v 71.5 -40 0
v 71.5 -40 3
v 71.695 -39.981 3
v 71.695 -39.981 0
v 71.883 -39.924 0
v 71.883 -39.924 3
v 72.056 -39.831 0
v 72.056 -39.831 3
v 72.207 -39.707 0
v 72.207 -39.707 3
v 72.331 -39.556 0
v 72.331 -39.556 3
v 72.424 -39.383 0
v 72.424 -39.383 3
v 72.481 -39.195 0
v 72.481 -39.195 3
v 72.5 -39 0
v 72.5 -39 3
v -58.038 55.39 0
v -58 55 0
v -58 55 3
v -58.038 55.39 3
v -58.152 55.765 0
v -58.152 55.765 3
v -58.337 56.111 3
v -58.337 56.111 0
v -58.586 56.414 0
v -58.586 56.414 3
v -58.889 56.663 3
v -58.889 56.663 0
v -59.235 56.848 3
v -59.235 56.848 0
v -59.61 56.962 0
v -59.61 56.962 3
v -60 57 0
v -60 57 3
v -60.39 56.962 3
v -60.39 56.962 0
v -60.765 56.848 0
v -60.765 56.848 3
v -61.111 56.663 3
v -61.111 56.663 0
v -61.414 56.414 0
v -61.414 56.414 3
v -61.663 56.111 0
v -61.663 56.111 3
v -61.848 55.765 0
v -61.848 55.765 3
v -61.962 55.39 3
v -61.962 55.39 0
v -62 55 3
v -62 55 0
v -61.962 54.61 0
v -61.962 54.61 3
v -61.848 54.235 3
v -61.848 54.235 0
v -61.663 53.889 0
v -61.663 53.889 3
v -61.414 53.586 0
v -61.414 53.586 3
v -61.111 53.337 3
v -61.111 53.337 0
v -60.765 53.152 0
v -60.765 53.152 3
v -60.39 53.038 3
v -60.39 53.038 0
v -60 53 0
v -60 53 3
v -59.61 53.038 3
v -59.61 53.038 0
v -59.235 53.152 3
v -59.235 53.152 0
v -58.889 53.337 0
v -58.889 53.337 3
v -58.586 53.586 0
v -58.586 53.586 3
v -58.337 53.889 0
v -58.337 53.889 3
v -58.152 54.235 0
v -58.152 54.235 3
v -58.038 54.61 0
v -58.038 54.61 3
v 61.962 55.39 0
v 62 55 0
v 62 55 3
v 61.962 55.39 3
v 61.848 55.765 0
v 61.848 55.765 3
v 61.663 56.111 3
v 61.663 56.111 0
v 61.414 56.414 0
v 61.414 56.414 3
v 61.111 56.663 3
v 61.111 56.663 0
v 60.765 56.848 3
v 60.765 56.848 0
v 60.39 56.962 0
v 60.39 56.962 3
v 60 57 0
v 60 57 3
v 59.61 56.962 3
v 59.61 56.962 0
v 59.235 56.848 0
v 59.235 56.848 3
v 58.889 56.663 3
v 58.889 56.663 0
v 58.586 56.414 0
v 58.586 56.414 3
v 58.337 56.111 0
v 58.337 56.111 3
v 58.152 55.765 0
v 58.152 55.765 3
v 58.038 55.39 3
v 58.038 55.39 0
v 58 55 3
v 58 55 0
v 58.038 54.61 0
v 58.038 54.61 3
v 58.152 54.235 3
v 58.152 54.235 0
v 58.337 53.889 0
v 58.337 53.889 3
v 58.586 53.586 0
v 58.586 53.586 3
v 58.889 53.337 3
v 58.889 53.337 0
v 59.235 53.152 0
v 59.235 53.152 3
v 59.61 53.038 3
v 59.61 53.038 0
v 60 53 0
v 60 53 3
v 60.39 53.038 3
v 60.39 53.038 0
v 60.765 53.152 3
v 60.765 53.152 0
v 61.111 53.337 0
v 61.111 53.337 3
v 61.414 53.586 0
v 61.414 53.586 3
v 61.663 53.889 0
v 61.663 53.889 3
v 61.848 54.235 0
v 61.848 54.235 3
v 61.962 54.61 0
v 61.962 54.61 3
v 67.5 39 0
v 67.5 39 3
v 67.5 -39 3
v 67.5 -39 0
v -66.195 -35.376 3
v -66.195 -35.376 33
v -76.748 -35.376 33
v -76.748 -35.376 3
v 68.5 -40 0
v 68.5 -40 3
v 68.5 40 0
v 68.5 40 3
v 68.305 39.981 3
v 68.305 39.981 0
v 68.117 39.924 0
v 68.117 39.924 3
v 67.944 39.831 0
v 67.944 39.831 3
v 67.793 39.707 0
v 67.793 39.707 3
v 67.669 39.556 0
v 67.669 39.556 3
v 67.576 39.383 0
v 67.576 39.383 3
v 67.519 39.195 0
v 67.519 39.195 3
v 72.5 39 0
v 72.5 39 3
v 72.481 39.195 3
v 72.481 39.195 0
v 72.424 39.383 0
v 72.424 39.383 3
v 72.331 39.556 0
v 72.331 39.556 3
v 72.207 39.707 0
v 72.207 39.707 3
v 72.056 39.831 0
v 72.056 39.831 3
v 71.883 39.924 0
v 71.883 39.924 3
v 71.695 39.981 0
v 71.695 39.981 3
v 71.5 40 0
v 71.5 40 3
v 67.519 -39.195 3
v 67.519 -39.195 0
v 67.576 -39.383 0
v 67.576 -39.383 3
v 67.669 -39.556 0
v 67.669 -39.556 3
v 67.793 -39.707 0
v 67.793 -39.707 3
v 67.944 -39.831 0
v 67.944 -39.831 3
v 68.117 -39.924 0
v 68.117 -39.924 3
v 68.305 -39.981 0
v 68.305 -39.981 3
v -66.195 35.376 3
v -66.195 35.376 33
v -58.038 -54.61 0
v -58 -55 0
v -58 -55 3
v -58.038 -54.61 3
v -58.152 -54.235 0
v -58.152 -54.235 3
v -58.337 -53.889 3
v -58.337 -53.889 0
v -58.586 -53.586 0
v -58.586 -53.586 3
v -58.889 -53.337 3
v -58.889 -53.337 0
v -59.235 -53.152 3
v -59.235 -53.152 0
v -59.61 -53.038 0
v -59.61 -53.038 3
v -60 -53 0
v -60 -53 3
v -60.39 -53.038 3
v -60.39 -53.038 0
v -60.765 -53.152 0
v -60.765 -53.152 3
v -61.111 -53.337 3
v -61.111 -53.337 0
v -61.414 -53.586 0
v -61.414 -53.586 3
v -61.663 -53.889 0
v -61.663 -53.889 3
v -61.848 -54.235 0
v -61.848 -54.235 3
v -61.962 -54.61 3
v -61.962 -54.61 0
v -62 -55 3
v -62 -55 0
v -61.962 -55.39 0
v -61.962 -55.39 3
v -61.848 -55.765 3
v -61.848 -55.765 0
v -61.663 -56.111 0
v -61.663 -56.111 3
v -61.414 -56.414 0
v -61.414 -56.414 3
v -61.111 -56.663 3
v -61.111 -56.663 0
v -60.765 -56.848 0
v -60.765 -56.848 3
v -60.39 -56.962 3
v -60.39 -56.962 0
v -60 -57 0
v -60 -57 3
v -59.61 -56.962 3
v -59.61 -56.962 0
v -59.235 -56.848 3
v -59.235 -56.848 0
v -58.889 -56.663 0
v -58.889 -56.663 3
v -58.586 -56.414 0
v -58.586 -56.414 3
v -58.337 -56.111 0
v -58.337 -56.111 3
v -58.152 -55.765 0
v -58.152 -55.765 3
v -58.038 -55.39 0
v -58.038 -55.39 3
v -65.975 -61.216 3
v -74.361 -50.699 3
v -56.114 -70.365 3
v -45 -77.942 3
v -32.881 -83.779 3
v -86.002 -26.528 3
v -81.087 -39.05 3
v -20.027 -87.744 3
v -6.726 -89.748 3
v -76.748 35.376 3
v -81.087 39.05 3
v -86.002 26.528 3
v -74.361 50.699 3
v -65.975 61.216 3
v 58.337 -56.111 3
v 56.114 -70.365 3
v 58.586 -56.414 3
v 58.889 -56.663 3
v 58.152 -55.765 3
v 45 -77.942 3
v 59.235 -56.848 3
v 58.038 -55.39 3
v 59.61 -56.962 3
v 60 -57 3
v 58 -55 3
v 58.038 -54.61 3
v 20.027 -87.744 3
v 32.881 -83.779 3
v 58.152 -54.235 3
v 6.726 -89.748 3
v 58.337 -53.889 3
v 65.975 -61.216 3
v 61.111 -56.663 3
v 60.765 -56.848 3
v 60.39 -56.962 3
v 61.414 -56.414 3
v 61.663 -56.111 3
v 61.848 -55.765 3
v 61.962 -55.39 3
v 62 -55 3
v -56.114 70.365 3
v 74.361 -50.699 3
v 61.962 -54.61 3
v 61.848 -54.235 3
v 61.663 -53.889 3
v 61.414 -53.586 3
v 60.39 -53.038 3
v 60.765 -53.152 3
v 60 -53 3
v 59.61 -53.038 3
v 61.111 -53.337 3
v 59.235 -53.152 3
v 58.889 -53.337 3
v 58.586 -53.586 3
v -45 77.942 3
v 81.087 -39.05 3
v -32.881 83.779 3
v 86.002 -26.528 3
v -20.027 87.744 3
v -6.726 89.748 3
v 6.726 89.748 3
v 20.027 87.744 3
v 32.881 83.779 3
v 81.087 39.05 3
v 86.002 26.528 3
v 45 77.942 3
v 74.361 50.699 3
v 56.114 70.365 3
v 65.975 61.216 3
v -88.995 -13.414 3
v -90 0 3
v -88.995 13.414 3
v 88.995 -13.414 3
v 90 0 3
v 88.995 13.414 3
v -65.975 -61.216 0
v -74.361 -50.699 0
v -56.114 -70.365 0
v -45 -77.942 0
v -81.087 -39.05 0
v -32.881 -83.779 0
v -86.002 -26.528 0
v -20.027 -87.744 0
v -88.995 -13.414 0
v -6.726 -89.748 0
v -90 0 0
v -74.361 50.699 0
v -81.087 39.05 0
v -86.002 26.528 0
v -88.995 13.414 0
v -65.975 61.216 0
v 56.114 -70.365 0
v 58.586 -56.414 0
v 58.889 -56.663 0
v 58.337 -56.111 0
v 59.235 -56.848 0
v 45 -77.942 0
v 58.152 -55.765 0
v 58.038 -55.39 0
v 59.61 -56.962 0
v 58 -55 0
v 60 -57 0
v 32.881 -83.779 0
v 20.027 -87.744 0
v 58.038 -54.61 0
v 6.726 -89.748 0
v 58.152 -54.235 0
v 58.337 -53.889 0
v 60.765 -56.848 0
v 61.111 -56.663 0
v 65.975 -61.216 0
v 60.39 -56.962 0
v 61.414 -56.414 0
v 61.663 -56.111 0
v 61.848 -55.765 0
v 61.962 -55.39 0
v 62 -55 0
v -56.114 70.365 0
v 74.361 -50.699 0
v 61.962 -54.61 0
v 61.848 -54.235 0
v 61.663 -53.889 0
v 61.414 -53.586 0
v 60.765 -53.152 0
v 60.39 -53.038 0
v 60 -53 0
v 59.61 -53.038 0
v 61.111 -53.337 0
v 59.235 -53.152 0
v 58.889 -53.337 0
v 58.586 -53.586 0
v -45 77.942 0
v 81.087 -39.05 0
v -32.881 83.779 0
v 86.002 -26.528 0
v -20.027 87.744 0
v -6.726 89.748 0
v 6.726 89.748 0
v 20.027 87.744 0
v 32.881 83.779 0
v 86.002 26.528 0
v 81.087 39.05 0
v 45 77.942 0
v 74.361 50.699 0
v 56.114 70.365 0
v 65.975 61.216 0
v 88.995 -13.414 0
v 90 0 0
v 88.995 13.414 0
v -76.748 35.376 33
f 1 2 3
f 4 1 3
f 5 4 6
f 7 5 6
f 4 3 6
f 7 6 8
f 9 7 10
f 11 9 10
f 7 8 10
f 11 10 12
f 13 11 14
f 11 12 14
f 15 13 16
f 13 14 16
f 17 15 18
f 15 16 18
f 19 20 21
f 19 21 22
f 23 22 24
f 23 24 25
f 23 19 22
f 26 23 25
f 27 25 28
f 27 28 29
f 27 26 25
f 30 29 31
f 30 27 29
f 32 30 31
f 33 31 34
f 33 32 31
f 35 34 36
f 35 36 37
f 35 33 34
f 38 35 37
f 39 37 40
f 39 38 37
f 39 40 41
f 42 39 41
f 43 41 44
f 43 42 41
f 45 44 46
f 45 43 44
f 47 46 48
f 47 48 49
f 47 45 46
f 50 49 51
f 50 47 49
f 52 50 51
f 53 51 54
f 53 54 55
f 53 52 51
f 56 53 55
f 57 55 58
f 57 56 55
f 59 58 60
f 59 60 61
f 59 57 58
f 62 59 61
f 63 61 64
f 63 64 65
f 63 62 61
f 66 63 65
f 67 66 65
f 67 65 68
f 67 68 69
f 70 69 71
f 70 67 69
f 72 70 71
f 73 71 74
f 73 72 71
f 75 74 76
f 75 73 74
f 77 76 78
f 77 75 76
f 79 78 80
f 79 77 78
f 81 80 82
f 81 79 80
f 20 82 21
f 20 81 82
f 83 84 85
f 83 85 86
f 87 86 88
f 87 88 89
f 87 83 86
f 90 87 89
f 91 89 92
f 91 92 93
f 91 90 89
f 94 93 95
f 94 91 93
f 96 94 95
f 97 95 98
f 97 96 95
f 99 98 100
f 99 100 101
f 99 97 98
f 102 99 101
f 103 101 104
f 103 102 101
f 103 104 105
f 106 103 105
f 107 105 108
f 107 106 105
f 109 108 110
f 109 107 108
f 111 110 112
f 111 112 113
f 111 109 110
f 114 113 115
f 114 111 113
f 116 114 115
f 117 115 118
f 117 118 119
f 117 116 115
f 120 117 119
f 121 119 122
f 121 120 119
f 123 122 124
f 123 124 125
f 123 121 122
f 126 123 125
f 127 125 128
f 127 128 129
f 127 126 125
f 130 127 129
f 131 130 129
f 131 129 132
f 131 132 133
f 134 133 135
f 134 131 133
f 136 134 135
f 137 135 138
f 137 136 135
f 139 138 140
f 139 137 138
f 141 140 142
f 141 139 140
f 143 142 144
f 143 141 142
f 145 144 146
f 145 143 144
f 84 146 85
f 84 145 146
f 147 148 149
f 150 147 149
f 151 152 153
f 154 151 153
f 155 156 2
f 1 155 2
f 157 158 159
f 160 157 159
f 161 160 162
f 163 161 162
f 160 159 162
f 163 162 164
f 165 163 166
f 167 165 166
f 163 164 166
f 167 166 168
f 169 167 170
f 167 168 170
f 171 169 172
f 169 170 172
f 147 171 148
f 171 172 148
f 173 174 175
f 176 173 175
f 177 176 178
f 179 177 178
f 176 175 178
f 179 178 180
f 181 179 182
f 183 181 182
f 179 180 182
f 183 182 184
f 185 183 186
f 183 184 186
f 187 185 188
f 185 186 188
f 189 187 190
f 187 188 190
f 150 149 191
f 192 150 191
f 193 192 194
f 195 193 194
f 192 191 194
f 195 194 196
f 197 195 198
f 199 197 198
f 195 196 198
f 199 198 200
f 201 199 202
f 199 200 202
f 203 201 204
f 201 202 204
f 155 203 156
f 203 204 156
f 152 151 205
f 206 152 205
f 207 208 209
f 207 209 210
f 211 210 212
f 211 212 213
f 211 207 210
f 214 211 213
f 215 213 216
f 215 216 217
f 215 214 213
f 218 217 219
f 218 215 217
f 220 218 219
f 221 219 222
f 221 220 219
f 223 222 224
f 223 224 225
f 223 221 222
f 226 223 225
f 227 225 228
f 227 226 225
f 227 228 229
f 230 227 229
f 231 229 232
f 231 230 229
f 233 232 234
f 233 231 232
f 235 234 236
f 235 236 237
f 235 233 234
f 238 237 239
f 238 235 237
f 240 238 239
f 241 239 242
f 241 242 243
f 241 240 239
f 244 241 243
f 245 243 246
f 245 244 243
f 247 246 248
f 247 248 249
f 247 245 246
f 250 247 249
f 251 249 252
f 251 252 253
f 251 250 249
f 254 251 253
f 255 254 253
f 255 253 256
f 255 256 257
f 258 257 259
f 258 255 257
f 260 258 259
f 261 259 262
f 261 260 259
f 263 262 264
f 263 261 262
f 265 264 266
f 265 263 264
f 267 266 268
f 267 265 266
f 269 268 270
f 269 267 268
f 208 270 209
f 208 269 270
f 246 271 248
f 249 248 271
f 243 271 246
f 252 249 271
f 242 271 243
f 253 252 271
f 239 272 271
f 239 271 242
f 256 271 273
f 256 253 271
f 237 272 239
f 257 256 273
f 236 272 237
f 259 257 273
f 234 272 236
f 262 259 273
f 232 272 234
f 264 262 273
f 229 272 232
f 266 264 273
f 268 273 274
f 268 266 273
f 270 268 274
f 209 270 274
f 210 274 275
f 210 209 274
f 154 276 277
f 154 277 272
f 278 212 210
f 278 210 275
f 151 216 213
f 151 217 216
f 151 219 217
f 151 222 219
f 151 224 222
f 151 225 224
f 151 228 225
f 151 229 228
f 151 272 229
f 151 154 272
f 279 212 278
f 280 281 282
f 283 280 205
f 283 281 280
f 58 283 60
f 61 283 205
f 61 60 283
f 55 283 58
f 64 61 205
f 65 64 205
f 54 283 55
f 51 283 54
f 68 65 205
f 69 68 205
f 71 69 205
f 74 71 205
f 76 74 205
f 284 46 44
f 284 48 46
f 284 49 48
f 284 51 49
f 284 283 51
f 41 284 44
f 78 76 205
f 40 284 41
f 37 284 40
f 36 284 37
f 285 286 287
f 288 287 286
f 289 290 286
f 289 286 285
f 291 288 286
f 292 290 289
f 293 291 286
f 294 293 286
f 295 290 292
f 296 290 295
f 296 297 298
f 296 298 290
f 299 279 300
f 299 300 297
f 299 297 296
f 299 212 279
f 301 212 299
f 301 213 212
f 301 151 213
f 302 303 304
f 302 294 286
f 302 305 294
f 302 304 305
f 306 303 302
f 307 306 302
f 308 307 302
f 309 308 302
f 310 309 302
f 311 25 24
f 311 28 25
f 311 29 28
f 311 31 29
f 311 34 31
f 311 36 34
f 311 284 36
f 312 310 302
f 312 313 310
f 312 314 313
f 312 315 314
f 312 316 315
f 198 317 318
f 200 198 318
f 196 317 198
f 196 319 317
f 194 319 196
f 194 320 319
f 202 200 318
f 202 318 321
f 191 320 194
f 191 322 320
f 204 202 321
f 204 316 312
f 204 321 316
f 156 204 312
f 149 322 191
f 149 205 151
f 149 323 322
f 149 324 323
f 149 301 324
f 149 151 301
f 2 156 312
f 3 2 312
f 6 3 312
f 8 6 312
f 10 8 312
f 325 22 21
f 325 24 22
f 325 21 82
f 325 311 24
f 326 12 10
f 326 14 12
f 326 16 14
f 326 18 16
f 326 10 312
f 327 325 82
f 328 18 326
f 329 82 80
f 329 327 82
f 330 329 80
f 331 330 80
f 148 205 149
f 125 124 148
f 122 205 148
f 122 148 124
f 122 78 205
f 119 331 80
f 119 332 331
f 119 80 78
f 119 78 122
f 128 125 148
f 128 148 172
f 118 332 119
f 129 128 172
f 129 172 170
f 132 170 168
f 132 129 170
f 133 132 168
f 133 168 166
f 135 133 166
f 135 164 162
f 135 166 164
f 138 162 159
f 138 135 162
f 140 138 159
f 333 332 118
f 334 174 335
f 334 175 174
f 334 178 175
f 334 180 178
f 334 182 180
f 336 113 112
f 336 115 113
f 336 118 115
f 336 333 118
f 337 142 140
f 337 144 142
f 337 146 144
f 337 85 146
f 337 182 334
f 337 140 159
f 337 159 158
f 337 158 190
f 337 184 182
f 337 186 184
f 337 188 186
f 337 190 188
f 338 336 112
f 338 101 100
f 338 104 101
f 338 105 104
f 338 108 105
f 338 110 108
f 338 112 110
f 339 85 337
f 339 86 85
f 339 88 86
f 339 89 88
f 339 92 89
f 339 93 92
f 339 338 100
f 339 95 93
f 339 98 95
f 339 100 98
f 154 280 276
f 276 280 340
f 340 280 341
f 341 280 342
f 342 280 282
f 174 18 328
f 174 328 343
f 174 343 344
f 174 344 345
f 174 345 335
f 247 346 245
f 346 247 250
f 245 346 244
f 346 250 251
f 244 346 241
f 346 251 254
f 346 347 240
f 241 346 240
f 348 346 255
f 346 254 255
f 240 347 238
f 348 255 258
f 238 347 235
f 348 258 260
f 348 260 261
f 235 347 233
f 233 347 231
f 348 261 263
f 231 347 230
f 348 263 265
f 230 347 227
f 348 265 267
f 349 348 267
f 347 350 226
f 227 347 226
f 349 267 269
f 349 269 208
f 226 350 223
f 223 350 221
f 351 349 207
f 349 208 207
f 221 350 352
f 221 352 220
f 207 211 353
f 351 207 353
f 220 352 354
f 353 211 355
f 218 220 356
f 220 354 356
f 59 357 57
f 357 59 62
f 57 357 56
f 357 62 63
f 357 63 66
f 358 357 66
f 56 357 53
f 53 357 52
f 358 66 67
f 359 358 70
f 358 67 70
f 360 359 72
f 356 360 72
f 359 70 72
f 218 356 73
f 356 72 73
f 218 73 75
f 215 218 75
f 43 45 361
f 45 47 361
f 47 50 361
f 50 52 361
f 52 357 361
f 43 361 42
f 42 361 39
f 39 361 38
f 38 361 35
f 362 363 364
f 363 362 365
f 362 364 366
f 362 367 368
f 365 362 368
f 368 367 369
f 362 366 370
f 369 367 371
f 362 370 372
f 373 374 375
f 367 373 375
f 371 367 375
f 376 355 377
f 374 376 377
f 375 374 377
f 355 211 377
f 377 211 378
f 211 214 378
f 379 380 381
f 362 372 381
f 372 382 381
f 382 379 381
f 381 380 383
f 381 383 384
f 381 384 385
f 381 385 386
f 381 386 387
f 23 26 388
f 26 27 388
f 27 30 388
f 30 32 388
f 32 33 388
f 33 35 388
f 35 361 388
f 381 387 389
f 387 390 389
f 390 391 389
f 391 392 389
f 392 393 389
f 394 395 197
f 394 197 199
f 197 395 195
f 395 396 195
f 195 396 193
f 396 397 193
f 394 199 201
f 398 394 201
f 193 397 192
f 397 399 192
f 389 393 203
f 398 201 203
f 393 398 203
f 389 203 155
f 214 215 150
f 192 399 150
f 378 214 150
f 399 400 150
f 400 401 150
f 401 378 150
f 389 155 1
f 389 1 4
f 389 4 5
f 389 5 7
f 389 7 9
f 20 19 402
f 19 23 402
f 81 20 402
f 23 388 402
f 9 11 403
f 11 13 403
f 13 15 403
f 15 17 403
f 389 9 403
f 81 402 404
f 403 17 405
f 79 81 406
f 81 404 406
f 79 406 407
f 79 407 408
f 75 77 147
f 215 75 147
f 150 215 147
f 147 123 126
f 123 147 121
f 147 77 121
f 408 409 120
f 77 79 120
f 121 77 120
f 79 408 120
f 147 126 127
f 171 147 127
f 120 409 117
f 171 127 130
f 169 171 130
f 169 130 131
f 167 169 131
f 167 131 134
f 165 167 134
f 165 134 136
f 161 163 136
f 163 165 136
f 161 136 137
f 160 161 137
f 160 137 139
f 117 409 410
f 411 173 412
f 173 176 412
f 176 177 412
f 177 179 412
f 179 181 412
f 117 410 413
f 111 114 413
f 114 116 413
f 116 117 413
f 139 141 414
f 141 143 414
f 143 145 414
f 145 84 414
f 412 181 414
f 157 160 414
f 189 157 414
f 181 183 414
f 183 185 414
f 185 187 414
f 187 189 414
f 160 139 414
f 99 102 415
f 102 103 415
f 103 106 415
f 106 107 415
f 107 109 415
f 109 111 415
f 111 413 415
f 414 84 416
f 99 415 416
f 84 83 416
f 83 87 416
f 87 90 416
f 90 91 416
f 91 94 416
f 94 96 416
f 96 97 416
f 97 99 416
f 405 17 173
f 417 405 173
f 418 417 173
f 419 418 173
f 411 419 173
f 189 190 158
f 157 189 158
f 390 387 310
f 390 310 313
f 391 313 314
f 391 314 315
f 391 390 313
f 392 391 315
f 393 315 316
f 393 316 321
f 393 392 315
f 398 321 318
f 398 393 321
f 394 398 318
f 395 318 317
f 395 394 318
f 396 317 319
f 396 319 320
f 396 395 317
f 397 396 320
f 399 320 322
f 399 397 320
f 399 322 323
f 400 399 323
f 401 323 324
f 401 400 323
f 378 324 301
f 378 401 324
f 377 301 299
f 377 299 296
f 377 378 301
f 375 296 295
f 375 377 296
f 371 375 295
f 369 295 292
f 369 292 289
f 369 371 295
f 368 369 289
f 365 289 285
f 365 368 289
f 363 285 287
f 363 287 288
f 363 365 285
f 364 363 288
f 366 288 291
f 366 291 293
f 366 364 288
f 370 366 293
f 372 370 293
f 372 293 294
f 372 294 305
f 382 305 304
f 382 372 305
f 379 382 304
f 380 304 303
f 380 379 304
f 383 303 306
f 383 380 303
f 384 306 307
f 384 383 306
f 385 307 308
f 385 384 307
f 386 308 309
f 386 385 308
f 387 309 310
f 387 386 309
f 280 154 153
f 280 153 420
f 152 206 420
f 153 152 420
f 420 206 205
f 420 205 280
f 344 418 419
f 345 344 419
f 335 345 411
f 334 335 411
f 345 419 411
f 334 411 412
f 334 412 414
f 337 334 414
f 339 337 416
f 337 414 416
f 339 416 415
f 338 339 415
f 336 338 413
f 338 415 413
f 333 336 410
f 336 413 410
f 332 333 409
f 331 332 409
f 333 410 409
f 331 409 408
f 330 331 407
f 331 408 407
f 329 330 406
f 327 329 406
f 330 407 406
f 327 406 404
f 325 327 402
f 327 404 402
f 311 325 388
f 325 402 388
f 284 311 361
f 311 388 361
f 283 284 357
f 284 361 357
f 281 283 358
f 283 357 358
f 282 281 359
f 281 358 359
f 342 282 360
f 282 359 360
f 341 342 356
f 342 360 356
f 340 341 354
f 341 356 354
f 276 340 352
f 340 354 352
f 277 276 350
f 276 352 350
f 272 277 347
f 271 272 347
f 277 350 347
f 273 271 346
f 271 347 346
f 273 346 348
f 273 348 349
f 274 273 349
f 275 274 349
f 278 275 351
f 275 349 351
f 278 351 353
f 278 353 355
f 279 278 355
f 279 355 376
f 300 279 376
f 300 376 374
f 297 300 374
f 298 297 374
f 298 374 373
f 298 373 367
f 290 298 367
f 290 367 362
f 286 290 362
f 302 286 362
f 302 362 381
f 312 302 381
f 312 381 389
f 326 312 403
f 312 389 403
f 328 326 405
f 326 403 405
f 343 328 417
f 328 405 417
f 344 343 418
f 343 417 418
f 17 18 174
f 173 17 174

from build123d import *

# Parameters (mm, degrees)
EXTRUDE_1_OUTLINE_R   = 90
EXTRUDE_1_OUTLINE_R_2 = 2
EXTRUDE_1_DEPTH       = 3
SKETCH_4_W            = 10.552817488
SKETCH_4_H            = 70.751844526
EXTRUDE_2_DEPTH       = 30
CUT_EXTRUDE_1_DEPTH   = 30


# Read off the part's stored shape, not the designer's step: 填料-伸長1
with BuildPart() as part:
    # 填料-伸長1 outline → 填料-伸長1 (new body)
    with BuildSketch(Plane.XY):
        Circle(EXTRUDE_1_OUTLINE_R)
        with Locations((-60, -55)):
            Circle(EXTRUDE_1_OUTLINE_R_2, mode=Mode.SUBTRACT)
        with Locations((60, -55)):
            Circle(EXTRUDE_1_OUTLINE_R_2, mode=Mode.SUBTRACT)
        with Locations((-60, 55)):
            Circle(EXTRUDE_1_OUTLINE_R_2, mode=Mode.SUBTRACT)
        with Locations((60, 55)):
            Circle(EXTRUDE_1_OUTLINE_R_2, mode=Mode.SUBTRACT)
    extrude(amount=EXTRUDE_1_DEPTH)

    # 草圖4 → 填料-伸長2 (add)
    with BuildSketch(Plane(origin=(0, 0, 3), x_dir=(-1, 0, 0), z_dir=(0, 0, -1))):
        with Locations((71.471354809, 0)):
            Rectangle(SKETCH_4_W, SKETCH_4_H)
    extrude(amount=-EXTRUDE_2_DEPTH)

    # 草圖5 → 除料-伸長1 (cut)
    with BuildSketch(Plane.XY.offset(3)):
        with BuildLine():
            Line((68.5, -40), (71.5, -40))
            ThreePointArc((71.5, -40), (72.207106781, -39.707106781), (72.5, -39))
            Line((72.5, -39), (72.5, 39))
            ThreePointArc((72.5, 39), (72.207106781, 39.707106781), (71.5, 40))
            Line((71.5, 40), (68.5, 40))
            ThreePointArc((68.5, 40), (67.792893219, 39.707106781), (67.5, 39))
            Line((67.5, 39), (67.5, -39))
            ThreePointArc((67.5, -39), (67.792893219, -39.707106781), (68.5, -40))
        make_face()
    extrude(amount=-CUT_EXTRUDE_1_DEPTH, mode=Mode.SUBTRACT)


solid = part.part
